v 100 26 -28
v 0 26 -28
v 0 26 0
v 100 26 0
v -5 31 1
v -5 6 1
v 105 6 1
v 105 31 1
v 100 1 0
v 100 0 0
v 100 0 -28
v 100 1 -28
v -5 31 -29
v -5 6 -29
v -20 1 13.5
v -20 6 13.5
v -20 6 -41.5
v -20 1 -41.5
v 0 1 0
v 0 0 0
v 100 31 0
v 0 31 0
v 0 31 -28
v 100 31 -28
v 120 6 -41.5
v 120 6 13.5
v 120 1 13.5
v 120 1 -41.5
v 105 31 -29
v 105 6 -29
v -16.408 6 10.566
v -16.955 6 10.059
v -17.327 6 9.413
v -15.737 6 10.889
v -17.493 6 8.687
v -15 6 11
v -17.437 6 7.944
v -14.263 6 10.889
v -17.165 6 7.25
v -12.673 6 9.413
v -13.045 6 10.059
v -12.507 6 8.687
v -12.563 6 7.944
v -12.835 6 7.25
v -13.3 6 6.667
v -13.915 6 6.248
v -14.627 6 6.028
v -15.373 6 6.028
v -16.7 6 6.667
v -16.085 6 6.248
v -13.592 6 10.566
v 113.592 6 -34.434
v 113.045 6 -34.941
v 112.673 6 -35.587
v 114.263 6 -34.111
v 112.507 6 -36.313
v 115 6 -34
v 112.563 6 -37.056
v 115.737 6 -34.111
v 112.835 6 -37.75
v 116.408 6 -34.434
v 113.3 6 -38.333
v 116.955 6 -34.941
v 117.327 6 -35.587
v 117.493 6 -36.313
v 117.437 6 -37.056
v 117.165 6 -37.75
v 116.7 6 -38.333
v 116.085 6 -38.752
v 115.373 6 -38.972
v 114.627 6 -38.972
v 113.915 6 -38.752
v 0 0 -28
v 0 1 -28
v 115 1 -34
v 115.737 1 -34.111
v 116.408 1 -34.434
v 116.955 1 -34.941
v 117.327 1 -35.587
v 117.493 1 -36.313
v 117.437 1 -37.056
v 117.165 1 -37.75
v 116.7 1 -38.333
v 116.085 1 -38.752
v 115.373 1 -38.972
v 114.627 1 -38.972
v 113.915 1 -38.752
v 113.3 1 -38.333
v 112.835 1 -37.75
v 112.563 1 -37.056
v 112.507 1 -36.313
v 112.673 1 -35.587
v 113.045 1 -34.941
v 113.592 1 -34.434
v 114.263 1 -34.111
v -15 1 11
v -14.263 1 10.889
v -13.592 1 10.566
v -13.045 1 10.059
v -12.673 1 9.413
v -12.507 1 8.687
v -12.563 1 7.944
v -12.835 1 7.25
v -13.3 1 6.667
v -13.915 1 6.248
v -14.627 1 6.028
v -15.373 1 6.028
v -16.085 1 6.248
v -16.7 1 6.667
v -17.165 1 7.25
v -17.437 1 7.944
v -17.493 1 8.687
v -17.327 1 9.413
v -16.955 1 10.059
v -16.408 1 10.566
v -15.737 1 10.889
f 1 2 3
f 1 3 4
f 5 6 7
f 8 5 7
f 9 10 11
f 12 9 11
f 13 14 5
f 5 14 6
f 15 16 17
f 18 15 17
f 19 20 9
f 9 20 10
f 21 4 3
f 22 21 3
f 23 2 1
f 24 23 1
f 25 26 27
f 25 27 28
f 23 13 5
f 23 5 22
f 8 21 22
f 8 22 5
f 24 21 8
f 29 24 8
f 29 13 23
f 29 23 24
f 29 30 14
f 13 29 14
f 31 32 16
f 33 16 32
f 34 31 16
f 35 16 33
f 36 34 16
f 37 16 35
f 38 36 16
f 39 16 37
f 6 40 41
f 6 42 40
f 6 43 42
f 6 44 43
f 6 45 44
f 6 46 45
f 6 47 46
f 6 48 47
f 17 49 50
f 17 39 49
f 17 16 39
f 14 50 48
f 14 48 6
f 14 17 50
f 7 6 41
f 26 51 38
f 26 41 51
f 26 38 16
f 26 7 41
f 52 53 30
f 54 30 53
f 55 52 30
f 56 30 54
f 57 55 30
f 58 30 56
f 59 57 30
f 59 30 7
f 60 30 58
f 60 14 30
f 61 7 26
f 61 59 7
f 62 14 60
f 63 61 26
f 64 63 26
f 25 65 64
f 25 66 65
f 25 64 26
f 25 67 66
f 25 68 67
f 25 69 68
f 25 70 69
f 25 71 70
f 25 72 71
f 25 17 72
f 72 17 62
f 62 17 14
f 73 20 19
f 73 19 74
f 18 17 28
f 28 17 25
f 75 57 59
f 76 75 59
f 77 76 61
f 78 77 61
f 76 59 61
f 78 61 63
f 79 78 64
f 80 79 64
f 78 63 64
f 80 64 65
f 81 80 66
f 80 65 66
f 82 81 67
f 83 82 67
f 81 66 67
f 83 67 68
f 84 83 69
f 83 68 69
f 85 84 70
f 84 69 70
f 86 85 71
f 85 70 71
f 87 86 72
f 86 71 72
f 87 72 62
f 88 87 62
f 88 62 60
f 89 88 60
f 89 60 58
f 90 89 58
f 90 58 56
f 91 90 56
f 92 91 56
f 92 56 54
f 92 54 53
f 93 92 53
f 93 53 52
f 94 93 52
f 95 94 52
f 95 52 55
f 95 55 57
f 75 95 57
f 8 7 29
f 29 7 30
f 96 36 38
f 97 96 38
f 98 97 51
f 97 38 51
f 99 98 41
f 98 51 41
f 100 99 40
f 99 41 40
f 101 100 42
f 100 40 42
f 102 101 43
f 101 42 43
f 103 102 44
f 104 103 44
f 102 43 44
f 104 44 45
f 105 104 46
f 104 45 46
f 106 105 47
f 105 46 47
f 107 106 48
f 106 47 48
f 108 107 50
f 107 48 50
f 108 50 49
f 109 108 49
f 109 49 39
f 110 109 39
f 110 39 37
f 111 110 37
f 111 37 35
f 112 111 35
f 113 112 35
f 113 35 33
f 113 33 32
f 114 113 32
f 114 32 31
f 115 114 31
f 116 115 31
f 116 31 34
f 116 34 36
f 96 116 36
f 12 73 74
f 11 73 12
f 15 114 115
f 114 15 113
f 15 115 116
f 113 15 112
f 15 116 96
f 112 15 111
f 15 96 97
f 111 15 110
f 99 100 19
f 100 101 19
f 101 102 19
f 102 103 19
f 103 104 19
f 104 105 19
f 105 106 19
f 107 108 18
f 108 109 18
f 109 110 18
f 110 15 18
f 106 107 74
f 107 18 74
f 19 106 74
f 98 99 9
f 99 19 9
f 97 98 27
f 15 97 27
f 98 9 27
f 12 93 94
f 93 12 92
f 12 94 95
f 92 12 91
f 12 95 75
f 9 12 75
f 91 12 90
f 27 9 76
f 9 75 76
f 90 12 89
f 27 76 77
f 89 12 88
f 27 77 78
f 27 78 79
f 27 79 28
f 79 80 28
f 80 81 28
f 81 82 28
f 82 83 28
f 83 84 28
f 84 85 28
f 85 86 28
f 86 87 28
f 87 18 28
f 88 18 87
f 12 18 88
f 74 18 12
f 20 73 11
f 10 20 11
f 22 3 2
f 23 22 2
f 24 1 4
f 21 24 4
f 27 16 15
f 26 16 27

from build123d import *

# Parameters (mm, degrees)
SKETCH1_W           = 100
SKETCH1_H           = 28
BOSS_EXTRUDE1_DEPTH = 1
BOSS_EXTRUDE2_DEPTH = 30
BOSS_EXTRUDE3_DEPTH = 5
SKETCH4_W           = 140
SKETCH4_H           = 55
SKETCH4_W_2         = 120
SKETCH4_H_2         = 35
SKETCH4_W_3         = 110
SKETCH4_H_3         = 30
BOSS_EXTRUDE4_DEPTH = 5
SKETCH5_W           = 100
SKETCH5_H           = 28
BOSS_EXTRUDE5_DEPTH = 25
SKETCH6_R           = 2.5
CUT_EXTRUDE1_DEPTH  = 25


with BuildPart() as part:
    # Sketch1 → Boss-Extrude1 (new body)
    with BuildSketch(Plane(origin=(0, 0, 0), x_dir=(1, 0, 0), z_dir=(0, 1, 0))):
        with Locations((50, 14)):
            Rectangle(SKETCH1_W, SKETCH1_H)
    extrude(amount=BOSS_EXTRUDE1_DEPTH)



with BuildPart() as body_2:
    # Sketch2 → Boss-Extrude2 (new body)
    with BuildSketch(Plane(origin=(0, 1, 0), x_dir=(1, 0, 0), z_dir=(0, 1, 0))):
        Polygon((105, -1), (105, 14), (105, 29), (-5, 29), (-5, -1), align=None)
        Polygon((100, 28), (100, 14), (100, 0), (0, 0), (0, 28), align=None, mode=Mode.SUBTRACT)
    extrude(amount=BOSS_EXTRUDE2_DEPTH)

    # Sketch3 → Boss-Extrude3 (add)
    with BuildSketch(Plane.XZ.offset(-1)):
        Polygon((50, 3.5), (50, 1), (105, 1), (105, -29), (50, -29), (50, -31.5), (110, -31.5), (110, 3.5), align=None)
        Polygon((-5, 1), (50, 1), (50, 3.5), (-10, 3.5), (-10, -31.5), (50, -31.5), (50, -29), (-5, -29), align=None)
    extrude(amount=-BOSS_EXTRUDE3_DEPTH)

    # Sketch4 → Boss-Extrude4 (add)
    # profile 1 of 2: a face of its own
    with BuildSketch(Plane(origin=(0, 6, 0), x_dir=(1, 0, 0), z_dir=(0, 1, 0))):
        with Locations((50, 14)):
            Rectangle(SKETCH4_W, SKETCH4_H)
        with Locations((50, 14)):
            Rectangle(SKETCH4_W_2, SKETCH4_H_2, mode=Mode.SUBTRACT)
    # profile 2 of 2: a face of its own
    with BuildSketch(Plane(origin=(0, 6, 0), x_dir=(1, 0, 0), z_dir=(0, 1, 0))):
        with Locations((50, 14)):
            Rectangle(SKETCH4_W_2, SKETCH4_H_2)
        with Locations((50, 14)):
            Rectangle(SKETCH4_W_3, SKETCH4_H_3, mode=Mode.SUBTRACT)
    extrude(amount=-BOSS_EXTRUDE4_DEPTH)


with BuildPart() as part_1:
    add(part.part)

    add(body_2.part)  # Boss-Extrude5 merges body 2
    # Sketch5 → Boss-Extrude5 (add)
    with BuildSketch(Plane(origin=(0, 1, 0), x_dir=(1, 0, 0), z_dir=(0, 1, 0))):
        with Locations((50, 14)):
            Rectangle(SKETCH5_W, SKETCH5_H)
    extrude(amount=BOSS_EXTRUDE5_DEPTH)

    # Sketch6 → Cut-Extrude1 (cut)
    with BuildSketch(Plane(origin=(0, 6, 0), x_dir=(1, 0, 0), z_dir=(0, 1, 0))):
        with Locations(Location((115, 36.5, 0), (0, 0, 270))):
            Circle(SKETCH6_R)
        with Locations(Location((-15, -8.5, 0), (0, 0, 270))):
            Circle(SKETCH6_R)
    extrude(amount=-CUT_EXTRUDE1_DEPTH, mode=Mode.SUBTRACT)


solid = part_1.part
